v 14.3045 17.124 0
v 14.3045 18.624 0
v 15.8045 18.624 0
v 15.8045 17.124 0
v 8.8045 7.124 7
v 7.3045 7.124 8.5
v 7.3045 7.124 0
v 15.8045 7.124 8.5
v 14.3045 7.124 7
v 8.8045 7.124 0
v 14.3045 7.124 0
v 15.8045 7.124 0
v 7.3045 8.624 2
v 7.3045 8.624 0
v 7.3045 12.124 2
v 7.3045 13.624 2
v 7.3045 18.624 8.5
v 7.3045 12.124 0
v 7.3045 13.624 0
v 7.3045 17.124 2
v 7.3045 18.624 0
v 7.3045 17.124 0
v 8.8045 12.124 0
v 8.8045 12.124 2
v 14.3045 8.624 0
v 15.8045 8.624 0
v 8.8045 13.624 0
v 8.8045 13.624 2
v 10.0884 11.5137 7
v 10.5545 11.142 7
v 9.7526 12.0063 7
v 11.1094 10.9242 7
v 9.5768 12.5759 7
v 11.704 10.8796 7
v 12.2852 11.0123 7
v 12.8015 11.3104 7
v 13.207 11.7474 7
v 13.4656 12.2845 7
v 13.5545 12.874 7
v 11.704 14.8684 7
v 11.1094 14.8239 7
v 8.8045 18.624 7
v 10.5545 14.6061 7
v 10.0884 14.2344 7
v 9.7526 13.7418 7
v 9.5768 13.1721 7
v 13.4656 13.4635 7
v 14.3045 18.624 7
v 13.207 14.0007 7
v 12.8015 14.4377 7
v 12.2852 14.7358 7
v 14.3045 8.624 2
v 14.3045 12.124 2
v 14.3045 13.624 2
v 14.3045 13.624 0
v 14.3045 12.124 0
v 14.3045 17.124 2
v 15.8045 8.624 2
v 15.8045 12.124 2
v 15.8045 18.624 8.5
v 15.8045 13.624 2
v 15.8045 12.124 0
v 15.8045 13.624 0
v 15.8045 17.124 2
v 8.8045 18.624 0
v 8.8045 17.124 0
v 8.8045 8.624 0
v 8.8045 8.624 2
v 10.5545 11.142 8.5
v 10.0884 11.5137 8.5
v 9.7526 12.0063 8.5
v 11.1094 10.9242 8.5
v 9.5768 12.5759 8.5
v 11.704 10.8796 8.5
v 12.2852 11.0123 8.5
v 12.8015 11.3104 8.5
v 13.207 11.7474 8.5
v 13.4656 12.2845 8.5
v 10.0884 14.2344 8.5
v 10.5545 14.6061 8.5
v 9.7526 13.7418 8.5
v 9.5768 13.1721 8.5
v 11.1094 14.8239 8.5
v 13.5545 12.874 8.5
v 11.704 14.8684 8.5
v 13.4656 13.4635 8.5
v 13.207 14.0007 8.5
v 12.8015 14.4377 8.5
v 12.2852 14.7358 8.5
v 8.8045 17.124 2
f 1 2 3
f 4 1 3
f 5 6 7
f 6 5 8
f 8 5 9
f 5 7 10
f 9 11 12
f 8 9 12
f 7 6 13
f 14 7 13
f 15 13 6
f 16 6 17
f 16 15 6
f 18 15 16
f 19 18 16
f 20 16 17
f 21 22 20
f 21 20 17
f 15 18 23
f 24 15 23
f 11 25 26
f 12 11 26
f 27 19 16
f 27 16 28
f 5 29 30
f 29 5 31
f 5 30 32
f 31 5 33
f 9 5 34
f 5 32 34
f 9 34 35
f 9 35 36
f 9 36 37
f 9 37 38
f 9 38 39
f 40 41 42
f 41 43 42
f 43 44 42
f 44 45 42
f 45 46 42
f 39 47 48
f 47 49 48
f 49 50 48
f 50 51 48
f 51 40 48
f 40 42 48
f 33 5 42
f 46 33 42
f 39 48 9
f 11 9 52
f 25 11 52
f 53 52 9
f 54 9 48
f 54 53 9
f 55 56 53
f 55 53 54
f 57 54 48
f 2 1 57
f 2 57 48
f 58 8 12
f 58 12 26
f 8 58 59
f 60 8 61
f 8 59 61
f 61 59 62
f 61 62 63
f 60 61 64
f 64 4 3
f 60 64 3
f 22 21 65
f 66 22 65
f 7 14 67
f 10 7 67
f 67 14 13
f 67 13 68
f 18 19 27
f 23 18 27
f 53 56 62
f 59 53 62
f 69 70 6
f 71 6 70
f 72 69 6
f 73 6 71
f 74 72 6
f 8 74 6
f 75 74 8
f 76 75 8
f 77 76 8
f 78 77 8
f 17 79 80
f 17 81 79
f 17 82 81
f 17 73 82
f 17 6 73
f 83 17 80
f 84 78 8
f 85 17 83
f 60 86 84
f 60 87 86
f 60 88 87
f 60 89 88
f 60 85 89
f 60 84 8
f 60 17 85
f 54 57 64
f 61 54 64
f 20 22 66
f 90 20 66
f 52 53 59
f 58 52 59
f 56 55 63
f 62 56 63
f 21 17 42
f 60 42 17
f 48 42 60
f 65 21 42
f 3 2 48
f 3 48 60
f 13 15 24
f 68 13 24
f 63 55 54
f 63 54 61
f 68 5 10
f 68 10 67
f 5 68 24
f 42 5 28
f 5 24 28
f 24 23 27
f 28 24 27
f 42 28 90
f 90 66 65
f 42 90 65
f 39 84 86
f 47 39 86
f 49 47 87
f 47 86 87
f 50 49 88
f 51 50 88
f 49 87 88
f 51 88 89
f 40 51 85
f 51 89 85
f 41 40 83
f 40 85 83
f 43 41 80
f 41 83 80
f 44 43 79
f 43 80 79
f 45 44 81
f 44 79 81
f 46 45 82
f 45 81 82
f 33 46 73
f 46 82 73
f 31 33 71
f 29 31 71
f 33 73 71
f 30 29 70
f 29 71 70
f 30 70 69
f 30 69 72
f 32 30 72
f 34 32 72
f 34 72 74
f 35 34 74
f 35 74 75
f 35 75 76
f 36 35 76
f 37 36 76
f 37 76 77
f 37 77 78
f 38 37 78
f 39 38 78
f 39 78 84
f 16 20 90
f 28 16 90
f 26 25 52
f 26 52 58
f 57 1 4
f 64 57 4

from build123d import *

# Parameters (mm, degrees)
F0_W     = 1.5
F0_H     = 1.5
F1_DEPTH = 2
F2_W     = 1.5
F2_H     = 11.5
F3_DEPTH = 5
F4_W     = 8.5
F4_H     = 11.5
F5_DEPTH = 1.5
F6_R     = 2
F7_DEPTH = 25


with BuildPart() as f1:
    # F0 (on Top) → F1 (new body)
    with BuildSketch(Plane.XY):
        with Locations((8.05449, 7.874021)):
            Rectangle(F0_W, F0_H)
        with Locations((8.05449, 12.874021)):
            Rectangle(F0_W, F0_H)
        with Locations((8.05449, 17.874021)):
            Rectangle(F0_W, F0_H)
        with Locations((15.05449, 7.874021)):
            Rectangle(F0_W, F0_H)
        with Locations((15.05449, 12.874021)):
            Rectangle(F0_W, F0_H)
        with Locations((15.05449, 17.874021)):
            Rectangle(F0_W, F0_H)
    extrude(amount=F1_DEPTH)

    # F2 (on face) → F3 (join)
    with BuildSketch(Plane.XY.offset(2)):
        with Locations((8.05449, 12.874021)):
            Rectangle(F2_W, F2_H)
        with Locations((15.05449, 12.874021)):
            Rectangle(F2_W, F2_H)
    extrude(amount=F3_DEPTH)

    # F4 (on face) → F5 (join)
    with BuildSketch(Plane.XY.offset(7)):
        with Locations((11.55449, 12.874021)):
            Rectangle(F4_W, F4_H)
    extrude(amount=F5_DEPTH)

    # F6 (on face) → F7 (cut)
    with BuildSketch(Plane.XY.offset(8.5)):
        with Locations((11.55449, 12.874021)):
            Circle(F6_R)
    extrude(amount=-F7_DEPTH, mode=Mode.SUBTRACT)


solid = f1.part
